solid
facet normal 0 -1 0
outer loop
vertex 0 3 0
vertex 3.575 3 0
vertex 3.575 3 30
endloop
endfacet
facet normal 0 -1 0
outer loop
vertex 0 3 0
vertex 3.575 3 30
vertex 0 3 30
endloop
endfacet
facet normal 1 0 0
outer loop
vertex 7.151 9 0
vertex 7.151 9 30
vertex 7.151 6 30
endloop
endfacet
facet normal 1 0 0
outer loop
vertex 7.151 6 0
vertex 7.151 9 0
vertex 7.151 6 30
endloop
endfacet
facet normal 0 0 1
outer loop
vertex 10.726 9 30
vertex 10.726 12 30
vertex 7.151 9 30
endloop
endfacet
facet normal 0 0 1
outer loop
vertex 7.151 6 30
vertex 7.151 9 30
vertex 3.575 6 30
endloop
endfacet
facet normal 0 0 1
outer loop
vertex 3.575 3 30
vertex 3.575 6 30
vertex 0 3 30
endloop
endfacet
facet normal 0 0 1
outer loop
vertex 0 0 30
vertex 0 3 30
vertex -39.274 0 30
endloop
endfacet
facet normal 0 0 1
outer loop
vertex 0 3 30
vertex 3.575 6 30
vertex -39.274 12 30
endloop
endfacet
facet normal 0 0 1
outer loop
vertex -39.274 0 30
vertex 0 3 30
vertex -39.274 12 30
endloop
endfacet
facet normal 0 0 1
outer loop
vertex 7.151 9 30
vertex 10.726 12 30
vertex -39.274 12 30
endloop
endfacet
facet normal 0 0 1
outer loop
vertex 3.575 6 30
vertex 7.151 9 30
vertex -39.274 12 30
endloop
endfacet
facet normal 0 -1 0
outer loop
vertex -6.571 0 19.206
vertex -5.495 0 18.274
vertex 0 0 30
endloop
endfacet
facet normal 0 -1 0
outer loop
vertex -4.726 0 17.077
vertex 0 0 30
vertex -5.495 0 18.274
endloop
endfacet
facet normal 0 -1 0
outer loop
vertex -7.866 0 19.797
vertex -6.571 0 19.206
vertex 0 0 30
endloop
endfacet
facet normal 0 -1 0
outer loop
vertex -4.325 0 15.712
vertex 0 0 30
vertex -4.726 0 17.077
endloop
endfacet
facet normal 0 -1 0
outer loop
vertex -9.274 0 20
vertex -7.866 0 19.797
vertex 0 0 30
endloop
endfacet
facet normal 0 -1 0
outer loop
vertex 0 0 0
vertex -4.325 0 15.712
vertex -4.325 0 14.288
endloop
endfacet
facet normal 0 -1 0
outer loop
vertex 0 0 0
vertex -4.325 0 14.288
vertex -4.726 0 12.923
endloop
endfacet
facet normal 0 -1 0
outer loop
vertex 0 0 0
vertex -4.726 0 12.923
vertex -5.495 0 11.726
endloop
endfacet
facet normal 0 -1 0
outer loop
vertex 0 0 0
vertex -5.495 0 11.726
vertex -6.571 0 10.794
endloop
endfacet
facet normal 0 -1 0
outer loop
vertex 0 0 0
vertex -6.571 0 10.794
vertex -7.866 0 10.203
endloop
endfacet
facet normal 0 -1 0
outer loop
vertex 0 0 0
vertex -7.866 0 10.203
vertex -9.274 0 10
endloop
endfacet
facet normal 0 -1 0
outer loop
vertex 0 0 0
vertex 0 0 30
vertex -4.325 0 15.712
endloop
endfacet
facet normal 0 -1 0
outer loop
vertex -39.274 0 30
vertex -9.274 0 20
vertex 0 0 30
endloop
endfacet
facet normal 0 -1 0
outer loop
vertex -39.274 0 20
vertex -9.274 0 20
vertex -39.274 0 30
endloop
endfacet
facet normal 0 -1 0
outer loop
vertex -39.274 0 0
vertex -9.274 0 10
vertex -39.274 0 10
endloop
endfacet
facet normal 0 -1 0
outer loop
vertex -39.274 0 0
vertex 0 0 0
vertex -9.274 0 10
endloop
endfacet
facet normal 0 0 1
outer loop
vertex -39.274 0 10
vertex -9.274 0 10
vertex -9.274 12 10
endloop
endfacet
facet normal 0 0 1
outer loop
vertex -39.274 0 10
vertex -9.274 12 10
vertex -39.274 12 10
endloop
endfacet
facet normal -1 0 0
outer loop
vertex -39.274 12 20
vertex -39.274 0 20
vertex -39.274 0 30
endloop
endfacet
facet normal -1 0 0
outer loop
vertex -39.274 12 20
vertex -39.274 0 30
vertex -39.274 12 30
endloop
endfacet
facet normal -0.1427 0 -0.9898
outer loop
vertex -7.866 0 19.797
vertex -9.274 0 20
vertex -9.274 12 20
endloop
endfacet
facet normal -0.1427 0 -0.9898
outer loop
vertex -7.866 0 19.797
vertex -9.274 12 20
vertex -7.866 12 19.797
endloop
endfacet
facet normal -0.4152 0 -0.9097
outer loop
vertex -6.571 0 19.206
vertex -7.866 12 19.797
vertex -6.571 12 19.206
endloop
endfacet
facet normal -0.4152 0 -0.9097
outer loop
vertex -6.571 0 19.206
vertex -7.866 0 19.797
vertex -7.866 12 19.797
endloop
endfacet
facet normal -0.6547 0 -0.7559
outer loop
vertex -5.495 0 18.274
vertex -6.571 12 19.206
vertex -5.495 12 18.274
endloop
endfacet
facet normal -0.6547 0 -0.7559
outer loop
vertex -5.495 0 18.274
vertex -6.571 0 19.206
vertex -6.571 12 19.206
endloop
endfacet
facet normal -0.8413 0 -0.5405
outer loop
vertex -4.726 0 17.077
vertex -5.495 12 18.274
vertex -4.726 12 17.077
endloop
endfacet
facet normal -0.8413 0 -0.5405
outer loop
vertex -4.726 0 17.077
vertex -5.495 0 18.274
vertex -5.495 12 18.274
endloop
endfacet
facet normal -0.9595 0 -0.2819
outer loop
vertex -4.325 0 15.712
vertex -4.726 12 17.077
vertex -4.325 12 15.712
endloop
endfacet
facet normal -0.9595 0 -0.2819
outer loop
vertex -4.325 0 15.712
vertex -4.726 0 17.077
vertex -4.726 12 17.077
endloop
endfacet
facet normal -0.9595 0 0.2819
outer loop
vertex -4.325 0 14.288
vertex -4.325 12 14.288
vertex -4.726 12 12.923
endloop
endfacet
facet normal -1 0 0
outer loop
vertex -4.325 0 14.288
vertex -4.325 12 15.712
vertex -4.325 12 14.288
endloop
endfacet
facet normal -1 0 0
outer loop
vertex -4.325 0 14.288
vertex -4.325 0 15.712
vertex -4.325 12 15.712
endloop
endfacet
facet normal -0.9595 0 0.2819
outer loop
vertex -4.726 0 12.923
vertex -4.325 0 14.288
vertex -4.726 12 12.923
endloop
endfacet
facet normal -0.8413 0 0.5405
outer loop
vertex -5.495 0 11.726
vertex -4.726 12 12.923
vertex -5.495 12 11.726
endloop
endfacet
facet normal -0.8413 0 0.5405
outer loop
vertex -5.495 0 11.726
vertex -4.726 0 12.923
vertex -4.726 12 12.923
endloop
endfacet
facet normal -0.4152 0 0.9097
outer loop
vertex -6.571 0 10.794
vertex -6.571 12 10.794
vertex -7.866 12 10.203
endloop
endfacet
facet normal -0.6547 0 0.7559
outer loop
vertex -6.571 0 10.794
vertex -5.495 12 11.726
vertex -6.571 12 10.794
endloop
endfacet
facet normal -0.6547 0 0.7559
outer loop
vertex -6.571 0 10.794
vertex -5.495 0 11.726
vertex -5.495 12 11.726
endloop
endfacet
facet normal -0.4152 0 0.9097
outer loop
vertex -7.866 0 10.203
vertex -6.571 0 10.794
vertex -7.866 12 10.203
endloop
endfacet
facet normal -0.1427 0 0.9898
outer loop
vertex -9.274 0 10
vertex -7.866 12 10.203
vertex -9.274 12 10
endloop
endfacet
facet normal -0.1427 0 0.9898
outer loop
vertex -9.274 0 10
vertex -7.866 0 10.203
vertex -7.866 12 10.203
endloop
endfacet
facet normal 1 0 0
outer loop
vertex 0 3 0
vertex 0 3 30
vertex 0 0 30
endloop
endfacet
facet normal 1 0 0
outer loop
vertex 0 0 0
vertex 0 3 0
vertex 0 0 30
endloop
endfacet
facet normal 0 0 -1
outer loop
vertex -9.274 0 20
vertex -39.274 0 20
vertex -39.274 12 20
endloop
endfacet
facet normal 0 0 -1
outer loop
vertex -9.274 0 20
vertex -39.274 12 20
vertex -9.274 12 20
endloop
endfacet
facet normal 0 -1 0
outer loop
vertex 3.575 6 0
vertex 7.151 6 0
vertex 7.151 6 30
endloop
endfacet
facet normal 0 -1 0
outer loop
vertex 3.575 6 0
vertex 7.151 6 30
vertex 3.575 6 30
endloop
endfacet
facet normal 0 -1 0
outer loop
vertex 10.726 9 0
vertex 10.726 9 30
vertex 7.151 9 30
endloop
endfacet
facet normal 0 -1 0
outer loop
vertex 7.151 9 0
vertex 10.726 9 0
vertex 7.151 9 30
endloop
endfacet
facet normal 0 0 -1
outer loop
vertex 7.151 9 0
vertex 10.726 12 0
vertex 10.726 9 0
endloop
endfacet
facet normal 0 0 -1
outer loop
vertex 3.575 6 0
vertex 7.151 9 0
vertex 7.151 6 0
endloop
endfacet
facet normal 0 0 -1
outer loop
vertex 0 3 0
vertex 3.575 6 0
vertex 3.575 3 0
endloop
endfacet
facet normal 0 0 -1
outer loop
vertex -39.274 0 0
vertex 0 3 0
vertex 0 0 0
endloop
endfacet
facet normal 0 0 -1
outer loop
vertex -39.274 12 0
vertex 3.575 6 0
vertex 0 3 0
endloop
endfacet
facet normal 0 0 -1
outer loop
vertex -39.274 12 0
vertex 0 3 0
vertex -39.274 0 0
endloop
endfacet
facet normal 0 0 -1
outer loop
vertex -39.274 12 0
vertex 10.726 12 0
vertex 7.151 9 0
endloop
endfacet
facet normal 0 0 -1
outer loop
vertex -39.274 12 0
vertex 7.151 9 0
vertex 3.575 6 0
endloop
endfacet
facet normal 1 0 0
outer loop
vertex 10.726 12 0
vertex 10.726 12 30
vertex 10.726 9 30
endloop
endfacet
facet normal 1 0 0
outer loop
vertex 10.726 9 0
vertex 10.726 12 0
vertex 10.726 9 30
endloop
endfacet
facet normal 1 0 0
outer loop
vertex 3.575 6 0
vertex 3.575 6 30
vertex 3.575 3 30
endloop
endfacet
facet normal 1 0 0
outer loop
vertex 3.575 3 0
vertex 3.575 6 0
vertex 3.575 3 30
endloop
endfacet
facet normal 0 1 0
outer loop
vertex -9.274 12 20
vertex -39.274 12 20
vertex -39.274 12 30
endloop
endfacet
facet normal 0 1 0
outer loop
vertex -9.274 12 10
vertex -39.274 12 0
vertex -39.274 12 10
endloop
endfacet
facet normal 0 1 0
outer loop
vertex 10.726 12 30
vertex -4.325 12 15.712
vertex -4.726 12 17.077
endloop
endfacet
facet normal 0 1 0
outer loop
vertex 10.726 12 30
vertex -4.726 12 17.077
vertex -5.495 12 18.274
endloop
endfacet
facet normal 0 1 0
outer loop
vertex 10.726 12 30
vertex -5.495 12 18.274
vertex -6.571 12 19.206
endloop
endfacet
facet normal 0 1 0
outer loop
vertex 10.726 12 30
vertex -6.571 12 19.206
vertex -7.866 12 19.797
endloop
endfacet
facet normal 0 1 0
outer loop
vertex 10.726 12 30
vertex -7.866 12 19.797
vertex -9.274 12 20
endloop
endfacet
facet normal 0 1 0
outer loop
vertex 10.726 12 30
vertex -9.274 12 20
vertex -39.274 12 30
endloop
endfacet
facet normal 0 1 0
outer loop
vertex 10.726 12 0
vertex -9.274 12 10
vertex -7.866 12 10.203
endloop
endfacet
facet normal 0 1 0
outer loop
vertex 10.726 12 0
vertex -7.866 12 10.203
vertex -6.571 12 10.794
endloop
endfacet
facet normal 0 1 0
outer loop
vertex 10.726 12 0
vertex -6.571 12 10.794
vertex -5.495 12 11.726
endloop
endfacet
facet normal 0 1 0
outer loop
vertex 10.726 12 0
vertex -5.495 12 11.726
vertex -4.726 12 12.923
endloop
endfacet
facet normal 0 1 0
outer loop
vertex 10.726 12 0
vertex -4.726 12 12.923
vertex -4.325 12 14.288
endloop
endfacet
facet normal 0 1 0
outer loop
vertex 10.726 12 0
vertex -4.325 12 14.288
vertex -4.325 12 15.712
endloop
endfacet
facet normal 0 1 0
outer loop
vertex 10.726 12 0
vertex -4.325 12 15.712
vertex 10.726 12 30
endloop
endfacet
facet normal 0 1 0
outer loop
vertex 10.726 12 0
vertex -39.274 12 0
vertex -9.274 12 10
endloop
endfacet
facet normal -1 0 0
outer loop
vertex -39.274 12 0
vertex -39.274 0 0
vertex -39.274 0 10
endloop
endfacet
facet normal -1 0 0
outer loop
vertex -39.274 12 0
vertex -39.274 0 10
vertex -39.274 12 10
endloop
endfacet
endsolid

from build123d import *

# Parameters (mm, degrees)
BOSS_EXTRU_1_DEPTH      = 30
ENL_V_MAT_EXTRU_1_DEPTH = 13


with BuildPart() as part:
    # Esquisse2 → Boss.-Extru.1 (new body)
    with BuildSketch(Plane.XY):
        Polygon((0, 0), (-39.274217667, 0), (-39.274217667, 12), (10.725782333, 12), (10.725782333, 9), (7.150521556, 9), (7.150521556, 6), (3.575260778, 6), (3.575260778, 3), (0, 3), align=None)
    extrude(amount=BOSS_EXTRU_1_DEPTH)

    # Esquisse3 → Enlèv. mat.-Extru.1 (cut, through all)
    with BuildSketch(Plane.XZ):
        with BuildLine():
            Line((-9.274217667, 10), (-39.274217667, 10))
            Line((-39.274217667, 10), (-39.274217667, 20))
            Line((-39.274217667, 20), (-9.274217667, 20))
            ThreePointArc((-9.274217667, 20), (-4.274217667, 15), (-9.274217667, 10))
        make_face()
    extrude(amount=-ENL_V_MAT_EXTRU_1_DEPTH, mode=Mode.SUBTRACT)


solid = part.part
